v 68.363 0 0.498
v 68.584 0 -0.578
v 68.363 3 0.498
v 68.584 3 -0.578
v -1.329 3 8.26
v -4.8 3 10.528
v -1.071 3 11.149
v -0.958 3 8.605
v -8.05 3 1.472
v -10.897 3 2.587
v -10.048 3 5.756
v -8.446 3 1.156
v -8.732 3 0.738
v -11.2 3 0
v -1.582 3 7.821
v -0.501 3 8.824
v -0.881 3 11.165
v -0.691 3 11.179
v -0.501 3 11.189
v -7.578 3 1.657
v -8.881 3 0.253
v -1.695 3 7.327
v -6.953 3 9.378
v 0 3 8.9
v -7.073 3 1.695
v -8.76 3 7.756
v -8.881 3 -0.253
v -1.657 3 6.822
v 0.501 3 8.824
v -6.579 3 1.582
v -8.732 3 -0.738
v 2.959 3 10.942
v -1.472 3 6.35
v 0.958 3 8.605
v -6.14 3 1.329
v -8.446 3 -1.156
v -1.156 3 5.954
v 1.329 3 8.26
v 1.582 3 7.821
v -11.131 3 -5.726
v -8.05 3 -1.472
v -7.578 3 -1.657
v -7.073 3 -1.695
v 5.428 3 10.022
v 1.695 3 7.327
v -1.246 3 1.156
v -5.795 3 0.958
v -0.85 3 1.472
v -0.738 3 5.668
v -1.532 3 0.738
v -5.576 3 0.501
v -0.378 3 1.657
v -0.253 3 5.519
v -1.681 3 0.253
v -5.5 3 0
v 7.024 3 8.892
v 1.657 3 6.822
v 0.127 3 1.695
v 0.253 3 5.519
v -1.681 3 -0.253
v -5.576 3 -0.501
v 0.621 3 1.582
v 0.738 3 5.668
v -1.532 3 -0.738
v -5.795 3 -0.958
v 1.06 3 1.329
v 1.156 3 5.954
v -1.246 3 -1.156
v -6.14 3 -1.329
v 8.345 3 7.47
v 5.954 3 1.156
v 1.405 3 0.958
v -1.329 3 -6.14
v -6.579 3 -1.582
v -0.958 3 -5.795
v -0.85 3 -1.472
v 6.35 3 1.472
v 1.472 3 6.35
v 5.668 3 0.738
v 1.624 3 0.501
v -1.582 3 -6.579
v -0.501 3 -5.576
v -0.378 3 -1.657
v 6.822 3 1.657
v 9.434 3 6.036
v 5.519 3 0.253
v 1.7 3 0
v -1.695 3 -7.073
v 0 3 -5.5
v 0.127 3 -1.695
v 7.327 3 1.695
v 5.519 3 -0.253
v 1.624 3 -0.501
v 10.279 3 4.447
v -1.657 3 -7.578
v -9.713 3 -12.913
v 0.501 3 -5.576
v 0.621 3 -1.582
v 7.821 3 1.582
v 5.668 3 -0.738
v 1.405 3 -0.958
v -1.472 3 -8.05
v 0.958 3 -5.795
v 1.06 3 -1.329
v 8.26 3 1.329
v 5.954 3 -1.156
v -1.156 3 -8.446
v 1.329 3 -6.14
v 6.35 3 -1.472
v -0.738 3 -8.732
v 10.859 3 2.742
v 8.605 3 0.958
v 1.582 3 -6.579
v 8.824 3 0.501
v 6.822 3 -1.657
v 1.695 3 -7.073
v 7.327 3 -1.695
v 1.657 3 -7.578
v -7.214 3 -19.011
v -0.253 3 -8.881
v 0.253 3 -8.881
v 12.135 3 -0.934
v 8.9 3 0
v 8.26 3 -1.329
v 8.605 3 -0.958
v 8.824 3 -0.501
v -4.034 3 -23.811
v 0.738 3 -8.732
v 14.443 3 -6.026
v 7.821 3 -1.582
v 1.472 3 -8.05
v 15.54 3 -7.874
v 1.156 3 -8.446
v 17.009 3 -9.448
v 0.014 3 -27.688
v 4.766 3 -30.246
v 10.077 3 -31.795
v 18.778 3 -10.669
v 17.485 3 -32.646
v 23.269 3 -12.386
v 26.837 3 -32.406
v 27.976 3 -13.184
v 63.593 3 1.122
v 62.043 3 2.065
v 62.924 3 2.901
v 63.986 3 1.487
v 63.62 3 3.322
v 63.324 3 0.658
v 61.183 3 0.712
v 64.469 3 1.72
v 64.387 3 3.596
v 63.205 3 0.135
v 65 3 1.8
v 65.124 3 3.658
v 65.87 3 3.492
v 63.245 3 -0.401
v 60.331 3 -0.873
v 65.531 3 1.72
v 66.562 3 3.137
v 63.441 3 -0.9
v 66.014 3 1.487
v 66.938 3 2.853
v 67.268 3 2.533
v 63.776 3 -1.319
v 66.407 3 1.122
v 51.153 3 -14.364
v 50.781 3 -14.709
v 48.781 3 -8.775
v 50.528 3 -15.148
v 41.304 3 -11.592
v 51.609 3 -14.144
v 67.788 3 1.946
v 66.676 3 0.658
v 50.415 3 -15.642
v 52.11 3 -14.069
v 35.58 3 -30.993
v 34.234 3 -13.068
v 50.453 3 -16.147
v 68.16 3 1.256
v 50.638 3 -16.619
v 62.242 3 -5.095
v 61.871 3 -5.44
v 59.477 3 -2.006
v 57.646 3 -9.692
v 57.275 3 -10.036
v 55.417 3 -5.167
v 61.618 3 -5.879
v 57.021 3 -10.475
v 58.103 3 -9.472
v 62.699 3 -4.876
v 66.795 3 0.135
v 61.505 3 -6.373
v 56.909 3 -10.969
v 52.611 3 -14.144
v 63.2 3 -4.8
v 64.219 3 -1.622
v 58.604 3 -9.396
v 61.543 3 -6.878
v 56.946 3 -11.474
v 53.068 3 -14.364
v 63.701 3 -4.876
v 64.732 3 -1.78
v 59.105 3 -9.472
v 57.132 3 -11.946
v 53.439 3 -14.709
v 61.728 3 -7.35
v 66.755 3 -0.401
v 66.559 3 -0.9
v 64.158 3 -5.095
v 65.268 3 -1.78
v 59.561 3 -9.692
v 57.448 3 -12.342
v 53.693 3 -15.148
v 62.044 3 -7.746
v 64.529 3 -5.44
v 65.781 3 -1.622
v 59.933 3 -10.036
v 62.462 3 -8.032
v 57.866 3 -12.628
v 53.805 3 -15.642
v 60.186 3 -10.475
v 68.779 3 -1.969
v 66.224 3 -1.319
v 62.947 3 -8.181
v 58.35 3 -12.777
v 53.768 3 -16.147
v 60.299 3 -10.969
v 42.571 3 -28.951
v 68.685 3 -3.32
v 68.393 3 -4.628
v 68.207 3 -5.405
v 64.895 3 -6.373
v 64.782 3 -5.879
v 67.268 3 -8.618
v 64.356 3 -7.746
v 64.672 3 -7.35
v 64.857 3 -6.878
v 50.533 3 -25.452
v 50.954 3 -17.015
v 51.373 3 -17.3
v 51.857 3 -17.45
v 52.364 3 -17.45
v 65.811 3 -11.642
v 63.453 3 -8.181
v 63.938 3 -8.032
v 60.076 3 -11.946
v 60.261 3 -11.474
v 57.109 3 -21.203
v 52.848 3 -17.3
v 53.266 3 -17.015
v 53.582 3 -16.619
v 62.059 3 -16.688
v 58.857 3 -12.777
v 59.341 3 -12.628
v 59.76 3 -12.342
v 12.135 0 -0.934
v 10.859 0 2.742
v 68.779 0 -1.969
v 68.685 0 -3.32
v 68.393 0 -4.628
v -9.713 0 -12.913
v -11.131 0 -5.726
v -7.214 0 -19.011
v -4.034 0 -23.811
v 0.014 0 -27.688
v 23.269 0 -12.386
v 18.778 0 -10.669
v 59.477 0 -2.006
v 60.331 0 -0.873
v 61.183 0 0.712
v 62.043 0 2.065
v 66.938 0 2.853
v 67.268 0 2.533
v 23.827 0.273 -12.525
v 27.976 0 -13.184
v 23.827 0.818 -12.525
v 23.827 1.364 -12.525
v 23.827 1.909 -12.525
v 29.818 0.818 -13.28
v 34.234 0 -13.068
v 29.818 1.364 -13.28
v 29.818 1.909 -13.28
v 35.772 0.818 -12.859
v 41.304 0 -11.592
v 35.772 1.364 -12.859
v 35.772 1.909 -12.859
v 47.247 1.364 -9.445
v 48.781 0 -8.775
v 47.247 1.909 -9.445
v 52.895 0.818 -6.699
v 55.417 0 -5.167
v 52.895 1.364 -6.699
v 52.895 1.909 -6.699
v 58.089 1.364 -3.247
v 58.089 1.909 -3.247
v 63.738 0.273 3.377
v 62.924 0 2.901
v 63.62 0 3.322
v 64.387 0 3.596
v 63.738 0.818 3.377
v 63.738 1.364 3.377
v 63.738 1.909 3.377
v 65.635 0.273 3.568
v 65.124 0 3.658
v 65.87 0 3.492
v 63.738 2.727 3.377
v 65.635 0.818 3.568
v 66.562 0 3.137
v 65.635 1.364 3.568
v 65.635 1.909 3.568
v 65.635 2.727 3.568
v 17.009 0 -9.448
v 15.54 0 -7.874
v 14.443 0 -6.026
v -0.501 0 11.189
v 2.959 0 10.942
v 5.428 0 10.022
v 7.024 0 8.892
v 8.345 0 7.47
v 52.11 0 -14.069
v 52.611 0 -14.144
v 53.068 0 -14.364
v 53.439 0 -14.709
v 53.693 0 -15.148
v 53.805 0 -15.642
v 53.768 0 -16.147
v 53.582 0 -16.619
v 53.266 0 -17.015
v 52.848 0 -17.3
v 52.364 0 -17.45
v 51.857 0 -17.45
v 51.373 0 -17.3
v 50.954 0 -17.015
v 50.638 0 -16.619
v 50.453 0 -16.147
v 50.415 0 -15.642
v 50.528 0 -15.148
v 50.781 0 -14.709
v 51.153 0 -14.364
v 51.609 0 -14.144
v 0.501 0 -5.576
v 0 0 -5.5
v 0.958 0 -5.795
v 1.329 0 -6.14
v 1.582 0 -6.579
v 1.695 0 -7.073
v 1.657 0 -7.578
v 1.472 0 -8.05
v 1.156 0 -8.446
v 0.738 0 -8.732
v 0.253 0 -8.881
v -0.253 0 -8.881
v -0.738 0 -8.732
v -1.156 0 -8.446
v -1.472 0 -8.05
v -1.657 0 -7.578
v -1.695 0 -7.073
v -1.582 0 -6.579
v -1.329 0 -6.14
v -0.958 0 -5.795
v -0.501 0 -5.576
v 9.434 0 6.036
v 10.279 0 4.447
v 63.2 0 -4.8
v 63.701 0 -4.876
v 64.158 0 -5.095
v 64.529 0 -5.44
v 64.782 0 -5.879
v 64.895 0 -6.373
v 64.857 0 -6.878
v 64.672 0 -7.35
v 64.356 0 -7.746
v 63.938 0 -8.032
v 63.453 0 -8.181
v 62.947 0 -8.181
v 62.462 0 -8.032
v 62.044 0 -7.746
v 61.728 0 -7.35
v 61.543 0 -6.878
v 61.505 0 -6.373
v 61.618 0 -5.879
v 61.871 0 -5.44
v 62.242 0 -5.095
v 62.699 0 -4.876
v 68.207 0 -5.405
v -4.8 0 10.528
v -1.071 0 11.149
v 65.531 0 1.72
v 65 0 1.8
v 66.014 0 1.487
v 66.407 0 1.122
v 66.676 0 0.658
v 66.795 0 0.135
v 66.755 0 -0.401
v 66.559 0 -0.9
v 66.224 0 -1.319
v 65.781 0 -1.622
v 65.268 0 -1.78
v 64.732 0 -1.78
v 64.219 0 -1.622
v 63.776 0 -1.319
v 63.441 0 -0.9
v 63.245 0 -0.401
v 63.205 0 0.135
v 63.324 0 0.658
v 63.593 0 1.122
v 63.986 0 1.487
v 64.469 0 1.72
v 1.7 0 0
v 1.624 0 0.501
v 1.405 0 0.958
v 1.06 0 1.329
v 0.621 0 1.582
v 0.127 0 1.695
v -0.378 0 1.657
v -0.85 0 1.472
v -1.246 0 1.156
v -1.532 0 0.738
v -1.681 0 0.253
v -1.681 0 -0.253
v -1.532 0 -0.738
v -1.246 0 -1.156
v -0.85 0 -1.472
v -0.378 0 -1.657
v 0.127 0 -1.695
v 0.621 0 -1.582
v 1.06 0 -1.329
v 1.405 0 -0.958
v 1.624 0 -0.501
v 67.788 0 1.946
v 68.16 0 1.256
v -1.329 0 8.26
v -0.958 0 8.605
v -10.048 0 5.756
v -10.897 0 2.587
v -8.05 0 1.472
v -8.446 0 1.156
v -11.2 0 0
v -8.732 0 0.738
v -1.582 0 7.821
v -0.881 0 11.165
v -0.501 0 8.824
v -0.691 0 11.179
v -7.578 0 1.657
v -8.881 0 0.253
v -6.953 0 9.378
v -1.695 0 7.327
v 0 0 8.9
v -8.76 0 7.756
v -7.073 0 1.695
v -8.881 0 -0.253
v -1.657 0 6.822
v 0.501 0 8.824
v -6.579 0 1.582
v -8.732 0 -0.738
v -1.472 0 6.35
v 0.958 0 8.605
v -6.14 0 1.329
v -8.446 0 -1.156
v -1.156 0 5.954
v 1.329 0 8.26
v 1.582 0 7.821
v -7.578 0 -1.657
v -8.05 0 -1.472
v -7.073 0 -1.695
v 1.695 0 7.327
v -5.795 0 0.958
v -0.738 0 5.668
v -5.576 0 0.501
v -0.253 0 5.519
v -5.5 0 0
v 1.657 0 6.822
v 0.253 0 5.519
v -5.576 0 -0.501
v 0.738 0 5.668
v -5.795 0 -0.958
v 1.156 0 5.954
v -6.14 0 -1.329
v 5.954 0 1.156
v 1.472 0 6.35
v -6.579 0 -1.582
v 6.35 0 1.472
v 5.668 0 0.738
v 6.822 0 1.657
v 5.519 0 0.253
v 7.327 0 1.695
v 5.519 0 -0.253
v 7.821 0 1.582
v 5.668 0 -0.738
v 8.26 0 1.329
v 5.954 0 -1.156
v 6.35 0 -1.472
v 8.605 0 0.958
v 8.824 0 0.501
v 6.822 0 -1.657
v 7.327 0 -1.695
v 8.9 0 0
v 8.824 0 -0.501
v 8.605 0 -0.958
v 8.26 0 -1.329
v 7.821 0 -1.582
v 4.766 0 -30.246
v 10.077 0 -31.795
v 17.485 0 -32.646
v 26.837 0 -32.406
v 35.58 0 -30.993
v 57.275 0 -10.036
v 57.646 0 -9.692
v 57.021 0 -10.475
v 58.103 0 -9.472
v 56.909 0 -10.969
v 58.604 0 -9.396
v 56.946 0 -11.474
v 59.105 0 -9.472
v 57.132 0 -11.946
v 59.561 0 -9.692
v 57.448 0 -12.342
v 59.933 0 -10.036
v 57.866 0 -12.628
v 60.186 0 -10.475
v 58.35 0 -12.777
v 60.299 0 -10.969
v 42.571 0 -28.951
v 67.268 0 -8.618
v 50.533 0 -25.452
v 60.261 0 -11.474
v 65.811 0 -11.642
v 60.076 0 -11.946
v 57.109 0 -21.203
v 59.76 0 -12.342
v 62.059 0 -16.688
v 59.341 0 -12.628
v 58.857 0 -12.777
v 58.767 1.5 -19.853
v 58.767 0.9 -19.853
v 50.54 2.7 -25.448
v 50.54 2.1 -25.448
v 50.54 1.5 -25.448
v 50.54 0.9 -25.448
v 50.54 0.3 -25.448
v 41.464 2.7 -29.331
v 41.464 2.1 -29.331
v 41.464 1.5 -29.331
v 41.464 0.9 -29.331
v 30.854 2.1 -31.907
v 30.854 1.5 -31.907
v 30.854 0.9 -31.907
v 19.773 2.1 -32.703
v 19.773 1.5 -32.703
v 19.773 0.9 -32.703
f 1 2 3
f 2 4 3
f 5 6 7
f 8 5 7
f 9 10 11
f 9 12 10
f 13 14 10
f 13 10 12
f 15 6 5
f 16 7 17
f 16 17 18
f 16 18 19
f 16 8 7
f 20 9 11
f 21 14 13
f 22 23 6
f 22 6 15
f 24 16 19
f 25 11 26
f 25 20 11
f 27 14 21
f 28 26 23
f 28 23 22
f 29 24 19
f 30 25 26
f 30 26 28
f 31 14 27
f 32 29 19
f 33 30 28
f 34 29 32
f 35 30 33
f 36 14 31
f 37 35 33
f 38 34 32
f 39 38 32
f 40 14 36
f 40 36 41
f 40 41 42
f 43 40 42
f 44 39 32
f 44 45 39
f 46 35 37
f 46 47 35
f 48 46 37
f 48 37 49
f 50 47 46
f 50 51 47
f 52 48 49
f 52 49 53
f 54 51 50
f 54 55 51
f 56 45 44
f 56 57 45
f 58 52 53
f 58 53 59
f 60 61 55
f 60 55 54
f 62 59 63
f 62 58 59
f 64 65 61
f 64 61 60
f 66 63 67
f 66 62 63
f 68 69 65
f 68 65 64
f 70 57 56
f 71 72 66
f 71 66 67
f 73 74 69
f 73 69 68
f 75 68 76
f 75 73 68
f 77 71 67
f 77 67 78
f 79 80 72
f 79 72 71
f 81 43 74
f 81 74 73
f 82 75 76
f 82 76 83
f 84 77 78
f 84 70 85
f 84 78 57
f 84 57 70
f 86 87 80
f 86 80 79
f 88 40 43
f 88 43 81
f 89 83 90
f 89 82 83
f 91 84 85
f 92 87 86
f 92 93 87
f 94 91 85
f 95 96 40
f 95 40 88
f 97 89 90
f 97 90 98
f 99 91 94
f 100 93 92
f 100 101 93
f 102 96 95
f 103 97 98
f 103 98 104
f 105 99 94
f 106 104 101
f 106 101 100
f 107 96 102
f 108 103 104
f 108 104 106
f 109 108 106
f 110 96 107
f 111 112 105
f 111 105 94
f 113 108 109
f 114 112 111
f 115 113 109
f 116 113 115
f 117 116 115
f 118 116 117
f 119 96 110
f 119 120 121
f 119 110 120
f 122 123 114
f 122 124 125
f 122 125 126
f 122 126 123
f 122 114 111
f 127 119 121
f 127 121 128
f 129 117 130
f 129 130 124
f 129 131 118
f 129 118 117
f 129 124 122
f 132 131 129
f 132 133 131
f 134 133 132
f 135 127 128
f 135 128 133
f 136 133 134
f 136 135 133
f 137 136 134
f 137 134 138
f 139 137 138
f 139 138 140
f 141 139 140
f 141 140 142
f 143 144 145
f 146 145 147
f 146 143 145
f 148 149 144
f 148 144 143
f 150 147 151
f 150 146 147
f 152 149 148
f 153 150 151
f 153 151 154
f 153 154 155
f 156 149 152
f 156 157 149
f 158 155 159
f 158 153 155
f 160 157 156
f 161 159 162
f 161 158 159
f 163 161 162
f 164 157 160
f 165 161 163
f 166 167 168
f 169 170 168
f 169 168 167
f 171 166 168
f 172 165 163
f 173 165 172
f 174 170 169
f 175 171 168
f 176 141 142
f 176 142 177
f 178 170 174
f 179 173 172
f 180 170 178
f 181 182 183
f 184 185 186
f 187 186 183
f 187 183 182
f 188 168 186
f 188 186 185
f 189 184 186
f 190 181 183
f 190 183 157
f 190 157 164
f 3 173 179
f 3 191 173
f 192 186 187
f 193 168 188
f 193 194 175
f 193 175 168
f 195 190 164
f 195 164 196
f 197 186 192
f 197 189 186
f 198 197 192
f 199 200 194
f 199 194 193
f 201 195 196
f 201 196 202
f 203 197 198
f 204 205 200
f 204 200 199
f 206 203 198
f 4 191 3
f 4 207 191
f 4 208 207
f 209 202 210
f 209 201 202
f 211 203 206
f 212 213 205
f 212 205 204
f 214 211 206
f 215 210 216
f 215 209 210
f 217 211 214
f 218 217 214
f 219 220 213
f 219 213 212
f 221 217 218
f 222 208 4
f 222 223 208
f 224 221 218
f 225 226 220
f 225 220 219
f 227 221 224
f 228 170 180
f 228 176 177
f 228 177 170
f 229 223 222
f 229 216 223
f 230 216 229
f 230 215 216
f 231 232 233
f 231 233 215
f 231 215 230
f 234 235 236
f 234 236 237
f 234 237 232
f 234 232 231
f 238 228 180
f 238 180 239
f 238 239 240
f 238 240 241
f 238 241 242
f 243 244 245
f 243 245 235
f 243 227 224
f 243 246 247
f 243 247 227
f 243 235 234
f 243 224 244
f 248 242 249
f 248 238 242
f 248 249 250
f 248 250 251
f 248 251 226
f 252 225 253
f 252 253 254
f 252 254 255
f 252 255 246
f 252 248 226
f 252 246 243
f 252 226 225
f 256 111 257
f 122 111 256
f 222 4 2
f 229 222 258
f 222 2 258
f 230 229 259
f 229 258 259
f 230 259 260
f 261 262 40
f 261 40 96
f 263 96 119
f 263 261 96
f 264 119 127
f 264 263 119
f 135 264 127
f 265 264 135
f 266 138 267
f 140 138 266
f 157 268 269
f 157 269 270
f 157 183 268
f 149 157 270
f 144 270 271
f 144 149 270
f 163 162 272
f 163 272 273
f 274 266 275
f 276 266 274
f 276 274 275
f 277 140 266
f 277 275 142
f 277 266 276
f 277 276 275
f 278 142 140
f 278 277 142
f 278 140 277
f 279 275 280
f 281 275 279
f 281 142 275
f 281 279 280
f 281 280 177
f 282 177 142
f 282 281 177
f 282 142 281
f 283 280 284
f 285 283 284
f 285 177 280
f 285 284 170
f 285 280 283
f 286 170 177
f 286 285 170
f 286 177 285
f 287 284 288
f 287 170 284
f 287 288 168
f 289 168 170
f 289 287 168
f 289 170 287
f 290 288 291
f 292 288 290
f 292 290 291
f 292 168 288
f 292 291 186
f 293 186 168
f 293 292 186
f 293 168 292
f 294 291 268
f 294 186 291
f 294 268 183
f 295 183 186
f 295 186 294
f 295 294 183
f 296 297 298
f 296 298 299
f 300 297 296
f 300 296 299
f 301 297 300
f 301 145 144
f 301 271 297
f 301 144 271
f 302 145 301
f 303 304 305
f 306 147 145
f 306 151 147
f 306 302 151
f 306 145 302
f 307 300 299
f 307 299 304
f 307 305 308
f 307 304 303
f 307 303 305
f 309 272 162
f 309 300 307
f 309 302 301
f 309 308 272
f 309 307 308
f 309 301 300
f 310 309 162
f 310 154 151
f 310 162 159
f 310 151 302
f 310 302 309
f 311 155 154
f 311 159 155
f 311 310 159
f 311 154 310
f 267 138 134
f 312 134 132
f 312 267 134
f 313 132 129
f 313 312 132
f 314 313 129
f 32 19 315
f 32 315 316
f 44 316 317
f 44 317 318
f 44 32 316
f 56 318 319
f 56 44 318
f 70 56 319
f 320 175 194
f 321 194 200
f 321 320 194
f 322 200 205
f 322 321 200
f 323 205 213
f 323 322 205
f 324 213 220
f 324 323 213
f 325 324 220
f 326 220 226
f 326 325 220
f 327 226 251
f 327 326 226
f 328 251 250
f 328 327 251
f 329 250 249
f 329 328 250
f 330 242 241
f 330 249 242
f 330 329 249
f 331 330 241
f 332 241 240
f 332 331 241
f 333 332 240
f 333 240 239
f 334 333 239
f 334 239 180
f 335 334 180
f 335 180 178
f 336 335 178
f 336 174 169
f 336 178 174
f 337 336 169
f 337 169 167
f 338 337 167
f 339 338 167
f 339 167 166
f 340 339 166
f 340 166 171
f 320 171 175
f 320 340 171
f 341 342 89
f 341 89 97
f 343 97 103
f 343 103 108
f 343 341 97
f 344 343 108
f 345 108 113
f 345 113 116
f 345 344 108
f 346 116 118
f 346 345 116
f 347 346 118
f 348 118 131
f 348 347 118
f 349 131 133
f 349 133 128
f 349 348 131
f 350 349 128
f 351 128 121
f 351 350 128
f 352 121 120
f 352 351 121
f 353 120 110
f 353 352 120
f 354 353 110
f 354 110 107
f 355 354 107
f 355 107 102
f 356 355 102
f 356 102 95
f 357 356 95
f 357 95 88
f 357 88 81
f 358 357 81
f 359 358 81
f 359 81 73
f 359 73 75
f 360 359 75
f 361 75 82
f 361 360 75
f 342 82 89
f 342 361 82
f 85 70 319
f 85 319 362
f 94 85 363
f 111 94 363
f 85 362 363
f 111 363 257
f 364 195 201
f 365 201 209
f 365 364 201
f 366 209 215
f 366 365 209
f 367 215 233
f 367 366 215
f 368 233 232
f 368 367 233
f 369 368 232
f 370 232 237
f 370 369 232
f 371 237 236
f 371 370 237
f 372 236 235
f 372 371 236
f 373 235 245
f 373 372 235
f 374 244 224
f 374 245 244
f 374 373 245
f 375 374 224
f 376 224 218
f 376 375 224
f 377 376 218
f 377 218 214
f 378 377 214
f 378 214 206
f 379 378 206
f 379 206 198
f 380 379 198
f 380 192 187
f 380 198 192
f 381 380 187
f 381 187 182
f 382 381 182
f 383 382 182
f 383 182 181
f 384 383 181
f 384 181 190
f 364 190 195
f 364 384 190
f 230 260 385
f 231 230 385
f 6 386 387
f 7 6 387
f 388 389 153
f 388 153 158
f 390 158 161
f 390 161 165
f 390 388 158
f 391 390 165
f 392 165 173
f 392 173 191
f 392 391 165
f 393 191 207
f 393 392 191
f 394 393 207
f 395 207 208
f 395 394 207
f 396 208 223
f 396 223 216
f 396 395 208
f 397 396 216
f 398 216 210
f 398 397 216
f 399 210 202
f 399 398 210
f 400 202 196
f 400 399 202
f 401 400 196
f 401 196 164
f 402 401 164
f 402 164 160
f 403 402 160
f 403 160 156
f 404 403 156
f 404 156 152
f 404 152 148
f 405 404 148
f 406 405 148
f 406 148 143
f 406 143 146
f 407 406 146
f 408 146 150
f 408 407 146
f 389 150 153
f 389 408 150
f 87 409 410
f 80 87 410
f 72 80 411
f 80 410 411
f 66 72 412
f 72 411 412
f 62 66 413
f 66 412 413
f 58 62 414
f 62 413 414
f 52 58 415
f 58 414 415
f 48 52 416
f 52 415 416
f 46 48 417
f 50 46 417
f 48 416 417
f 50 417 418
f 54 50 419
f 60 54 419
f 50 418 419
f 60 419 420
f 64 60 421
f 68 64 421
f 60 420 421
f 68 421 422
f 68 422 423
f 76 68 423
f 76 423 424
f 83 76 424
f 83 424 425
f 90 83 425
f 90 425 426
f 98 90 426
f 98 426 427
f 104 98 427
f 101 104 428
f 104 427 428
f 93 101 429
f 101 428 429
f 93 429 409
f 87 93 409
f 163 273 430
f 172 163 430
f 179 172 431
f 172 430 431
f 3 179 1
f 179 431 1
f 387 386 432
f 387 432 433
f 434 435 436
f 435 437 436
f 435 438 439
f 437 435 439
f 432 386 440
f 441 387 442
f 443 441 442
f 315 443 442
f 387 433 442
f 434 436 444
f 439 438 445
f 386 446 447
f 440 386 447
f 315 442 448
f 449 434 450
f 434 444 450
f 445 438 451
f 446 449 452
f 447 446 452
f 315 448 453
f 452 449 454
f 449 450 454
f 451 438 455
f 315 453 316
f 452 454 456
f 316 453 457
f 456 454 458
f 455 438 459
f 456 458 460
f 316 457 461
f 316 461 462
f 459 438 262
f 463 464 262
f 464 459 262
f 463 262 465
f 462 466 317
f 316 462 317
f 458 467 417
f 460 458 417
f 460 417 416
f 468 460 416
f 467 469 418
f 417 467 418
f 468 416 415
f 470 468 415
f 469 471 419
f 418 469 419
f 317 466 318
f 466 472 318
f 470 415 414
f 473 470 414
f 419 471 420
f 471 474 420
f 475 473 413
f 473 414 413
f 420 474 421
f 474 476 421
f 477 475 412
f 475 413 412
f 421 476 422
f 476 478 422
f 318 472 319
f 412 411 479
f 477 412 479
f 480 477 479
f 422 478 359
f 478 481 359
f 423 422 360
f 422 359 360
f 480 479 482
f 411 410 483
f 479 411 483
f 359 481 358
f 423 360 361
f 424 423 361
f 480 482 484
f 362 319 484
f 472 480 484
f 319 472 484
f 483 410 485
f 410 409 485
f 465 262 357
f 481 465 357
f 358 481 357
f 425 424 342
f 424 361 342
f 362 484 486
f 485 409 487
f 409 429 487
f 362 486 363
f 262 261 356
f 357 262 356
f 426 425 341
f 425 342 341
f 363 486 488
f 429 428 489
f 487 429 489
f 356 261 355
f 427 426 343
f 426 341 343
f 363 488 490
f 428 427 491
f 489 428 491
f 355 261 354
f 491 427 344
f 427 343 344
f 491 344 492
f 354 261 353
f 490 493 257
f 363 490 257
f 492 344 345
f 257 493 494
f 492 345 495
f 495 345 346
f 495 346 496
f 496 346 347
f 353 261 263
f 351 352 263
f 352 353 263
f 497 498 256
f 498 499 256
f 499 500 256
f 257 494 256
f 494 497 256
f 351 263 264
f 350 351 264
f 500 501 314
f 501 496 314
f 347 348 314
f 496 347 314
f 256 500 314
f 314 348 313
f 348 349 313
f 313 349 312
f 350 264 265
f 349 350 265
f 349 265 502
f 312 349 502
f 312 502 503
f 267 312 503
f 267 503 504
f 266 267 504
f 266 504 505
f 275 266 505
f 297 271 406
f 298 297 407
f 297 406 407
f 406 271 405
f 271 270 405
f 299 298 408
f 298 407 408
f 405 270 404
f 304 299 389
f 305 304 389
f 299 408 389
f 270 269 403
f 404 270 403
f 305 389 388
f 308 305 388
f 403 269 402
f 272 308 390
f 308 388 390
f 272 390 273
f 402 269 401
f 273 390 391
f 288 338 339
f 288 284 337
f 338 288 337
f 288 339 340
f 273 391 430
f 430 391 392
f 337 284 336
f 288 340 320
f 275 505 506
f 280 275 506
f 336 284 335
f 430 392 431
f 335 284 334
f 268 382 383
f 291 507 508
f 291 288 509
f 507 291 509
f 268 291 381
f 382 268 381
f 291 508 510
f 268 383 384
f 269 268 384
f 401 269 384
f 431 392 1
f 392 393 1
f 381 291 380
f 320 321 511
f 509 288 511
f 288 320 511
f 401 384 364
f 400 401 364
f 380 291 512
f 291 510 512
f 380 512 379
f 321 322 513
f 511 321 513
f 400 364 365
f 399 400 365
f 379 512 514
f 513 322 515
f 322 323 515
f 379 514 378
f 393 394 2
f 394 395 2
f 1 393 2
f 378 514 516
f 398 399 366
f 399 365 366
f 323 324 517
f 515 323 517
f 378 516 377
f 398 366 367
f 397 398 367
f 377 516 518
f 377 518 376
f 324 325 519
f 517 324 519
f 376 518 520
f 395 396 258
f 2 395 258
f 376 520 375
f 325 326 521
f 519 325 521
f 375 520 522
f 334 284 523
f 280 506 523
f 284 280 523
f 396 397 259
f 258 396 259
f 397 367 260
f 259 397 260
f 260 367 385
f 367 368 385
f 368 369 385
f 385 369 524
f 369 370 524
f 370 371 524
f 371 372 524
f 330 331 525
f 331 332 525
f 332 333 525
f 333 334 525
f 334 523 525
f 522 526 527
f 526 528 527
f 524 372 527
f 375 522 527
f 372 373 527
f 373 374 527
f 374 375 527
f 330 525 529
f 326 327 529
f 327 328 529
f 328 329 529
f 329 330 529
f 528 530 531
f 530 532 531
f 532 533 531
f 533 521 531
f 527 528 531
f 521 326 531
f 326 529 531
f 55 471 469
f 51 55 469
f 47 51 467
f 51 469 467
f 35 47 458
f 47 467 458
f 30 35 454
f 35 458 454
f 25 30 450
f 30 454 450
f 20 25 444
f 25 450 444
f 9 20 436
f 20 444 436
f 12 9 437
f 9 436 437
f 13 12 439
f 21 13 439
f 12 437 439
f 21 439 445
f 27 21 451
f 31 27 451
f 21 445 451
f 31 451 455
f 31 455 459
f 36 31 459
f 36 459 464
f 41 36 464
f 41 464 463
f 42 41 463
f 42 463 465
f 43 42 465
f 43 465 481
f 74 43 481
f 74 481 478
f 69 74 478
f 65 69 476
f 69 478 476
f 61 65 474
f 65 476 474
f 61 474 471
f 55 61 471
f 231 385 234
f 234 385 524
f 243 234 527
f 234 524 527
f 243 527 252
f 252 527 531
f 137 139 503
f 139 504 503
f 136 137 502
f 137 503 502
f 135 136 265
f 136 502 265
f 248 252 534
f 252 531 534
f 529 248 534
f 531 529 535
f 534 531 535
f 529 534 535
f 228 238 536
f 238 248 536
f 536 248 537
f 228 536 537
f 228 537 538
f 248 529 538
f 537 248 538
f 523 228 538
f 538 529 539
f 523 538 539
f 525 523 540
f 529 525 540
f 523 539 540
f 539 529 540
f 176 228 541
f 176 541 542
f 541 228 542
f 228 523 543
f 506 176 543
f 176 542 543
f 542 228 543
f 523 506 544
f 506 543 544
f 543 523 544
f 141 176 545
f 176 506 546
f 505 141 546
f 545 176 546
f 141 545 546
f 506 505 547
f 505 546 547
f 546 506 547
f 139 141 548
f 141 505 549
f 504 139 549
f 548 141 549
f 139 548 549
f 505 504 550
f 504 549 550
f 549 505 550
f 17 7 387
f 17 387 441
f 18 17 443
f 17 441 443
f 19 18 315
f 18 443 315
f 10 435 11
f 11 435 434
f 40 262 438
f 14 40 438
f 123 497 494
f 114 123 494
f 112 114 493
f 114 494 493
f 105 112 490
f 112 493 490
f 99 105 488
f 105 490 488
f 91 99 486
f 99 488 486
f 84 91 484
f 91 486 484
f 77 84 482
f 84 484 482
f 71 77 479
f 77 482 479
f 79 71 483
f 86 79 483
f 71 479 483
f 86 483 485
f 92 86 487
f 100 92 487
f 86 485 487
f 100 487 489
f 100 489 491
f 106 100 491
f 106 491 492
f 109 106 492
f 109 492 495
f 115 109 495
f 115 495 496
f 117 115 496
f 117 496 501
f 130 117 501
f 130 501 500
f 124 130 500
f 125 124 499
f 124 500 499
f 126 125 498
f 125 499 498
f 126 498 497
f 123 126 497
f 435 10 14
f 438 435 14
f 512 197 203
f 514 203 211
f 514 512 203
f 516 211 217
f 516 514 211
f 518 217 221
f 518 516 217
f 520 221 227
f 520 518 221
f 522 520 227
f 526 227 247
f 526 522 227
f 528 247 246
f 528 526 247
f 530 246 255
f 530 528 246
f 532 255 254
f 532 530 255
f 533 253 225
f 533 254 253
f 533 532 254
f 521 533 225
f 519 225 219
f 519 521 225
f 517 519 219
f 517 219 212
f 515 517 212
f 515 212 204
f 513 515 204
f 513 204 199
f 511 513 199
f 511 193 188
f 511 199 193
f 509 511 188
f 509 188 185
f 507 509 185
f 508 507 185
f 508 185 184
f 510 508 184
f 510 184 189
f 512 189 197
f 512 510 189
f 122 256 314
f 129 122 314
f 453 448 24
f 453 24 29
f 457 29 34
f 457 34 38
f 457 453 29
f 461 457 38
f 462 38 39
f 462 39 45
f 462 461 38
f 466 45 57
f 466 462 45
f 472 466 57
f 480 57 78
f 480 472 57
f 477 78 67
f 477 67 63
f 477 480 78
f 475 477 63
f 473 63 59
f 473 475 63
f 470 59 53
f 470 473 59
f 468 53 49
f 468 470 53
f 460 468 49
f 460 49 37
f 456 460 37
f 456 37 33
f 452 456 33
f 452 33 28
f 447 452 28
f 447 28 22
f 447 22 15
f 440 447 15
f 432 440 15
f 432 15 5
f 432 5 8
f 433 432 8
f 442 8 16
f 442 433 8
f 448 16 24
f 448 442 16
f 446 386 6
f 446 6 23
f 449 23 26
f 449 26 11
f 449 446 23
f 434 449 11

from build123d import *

# Parameters (mm, degrees)
SKETCH_1_R          = 1.7
EXTRUDE_1_DEPTH     = 3
CUT_EXTRUDE_3_DEPTH = 3
SKETCH_3_R          = 1.7
EXTRUDE_3_DEPTH     = 3
FILLET_9_R          = 10
FILLET_10_R         = 10
FILLET_14_R         = 20
EXTRUDE_4_DEPTH     = 3
CUT_EXTRUDE_4_DEPTH = 3
EXTRUDE_6_DEPTH     = 3
FILLET_20_R         = 10
FILLET_21_R         = 10
SKETCH_8_R          = 1.8
CUT_EXTRUDE_5_DEPTH = 3
SKETCH_9_R          = 1.7
CUT_EXTRUDE_6_DEPTH = 10


with BuildPart() as part:
    # 草图1 → 凸台-拉伸1 (new body)
    # profile 1 of 23: a face of its own
    with BuildSketch(Plane(origin=(0, 0, 0), x_dir=(1, 0, 0), z_dir=(0, 1, 0))):
        with BuildLine():
            ThreePointArc((5.5, 0), (7.2, 1.7), (8.9, 0))
            Line((8.9, 0), (11.2, 0))
            ThreePointArc((11.2, 0), (9.208552546, 6.375151763), (3.9424, 10.4832))
            ThreePointArc((3.9424, 10.4832), (2.837711379, 10.834546328), (1.702623658, 11.06982713))
            ThreePointArc((1.702623658, 11.06982713), (-7.292825757, 8.500276024), (-11.2, 0))
            Line((-11.2, 0), (-8.9, 0))
            ThreePointArc((-8.9, 0), (-7.2, 1.7), (-5.5, 0))
            Line((-5.5, 0), (-1.7, 0))
            ThreePointArc((-1.7, 0), (0, 1.7), (1.7, 0))
            Line((1.7, 0), (5.5, 0))
        make_face()
        with Locations(Location((0, 7.2, 0), (0, 0, 270))):
            Circle(SKETCH_1_R, mode=Mode.SUBTRACT)
    # profile 2 of 23: a face of its own
    with BuildSketch(Plane(origin=(0, 0, 0), x_dir=(1, 0, 0), z_dir=(0, 1, 0))):
        with BuildLine():
            Line((11.2, 0), (8.9, 0))
            ThreePointArc((8.9, 0), (7.2, -1.7), (5.5, 0))
            Line((5.5, 0), (1.7, 0))
            ThreePointArc((1.7, 0), (0, -1.7), (-1.7, 0))
            Line((-1.7, 0), (-5.5, 0))
            ThreePointArc((-5.5, 0), (-7.2, -1.7), (-8.9, 0))
            Line((-8.9, 0), (-11.2, 0))
            ThreePointArc((-11.2, 0), (0, -11.2), (11.2, 0))
        make_face()
        with Locations(Location((0, -7.2, 0), (0, 0, 270))):
            Circle(SKETCH_1_R, mode=Mode.SUBTRACT)
    # profile 3 of 23: a face of its own
    with BuildSketch(Plane(origin=(0, 0, 0), x_dir=(1, 0, 0), z_dir=(0, 1, 0))):
        with BuildLine():
            ThreePointArc((36.4, 25.2), (54.219090886, 17.819090886), (61.6, 0))
            ThreePointArc((61.6, 0), (62.902494764, 2.675905788), (65.812042226, 3.301603765))
            ThreePointArc((65.812042226, 3.301603765), (37.256587325, 36.064283099), (1.702623658, 11.06982713))
            ThreePointArc((1.702623658, 11.06982713), (2.837711379, 10.834546328), (3.9424, 10.4832))
            ThreePointArc((3.9424, 10.4832), (17.872608925, 22.911095384), (36.4, 25.2))
        make_face()
    # profile 4 of 23: a face of its own
    with BuildSketch(Plane(origin=(0, 0, 0), x_dir=(1, 0, 0), z_dir=(0, 1, 0))):
        with BuildLine():
            ThreePointArc((68.4, 0), (28.6, 39.8), (-11.2, 0))
            ThreePointArc((-11.2, 0), (-7.292825757, 8.500276024), (1.702623658, 11.06982713))
            ThreePointArc((1.702623658, 11.06982713), (37.256587325, 36.064283099), (65.812042226, 3.301603765))
            ThreePointArc((65.812042226, 3.301603765), (67.675905788, 2.097505236), (68.4, 0))
        make_face()
    # profile 5 of 23: a face of its own
    with BuildSketch(Plane(origin=(0, 0, 0), x_dir=(1, 0, 0), z_dir=(0, 1, 0))):
        with BuildLine():
            ThreePointArc((3.9424, 10.4832), (9.208552546, 6.375151763), (11.2, 0))
            ThreePointArc((11.2, 0), (18.580909114, 17.819090886), (36.4, 25.2))
            ThreePointArc((36.4, 25.2), (17.872608925, 22.911095384), (3.9424, 10.4832))
        make_face()
    # profile 6 of 23: a face of its own
    with BuildSketch(Plane(origin=(0, 0, 0), x_dir=(1, 0, 0), z_dir=(0, 1, 0))):
        with BuildLine():
            ThreePointArc((36.4, 25.2), (52.935943621, 16.535943621), (61.6, 0))
            ThreePointArc((61.6, 0), (54.219090886, 17.819090886), (36.4, 25.2))
        make_face()
    # profile 7 of 23: a face of its own
    with BuildSketch(Plane(origin=(0, 0, 0), x_dir=(1, 0, 0), z_dir=(0, 1, 0))):
        with BuildLine():
            ThreePointArc((65.812042226, 3.301603765), (62.902494764, 2.675905788), (61.6, 0))
            Line((61.6, 0), (63.3, 0))
            ThreePointArc((63.3, 0), (64.094189641, 1.438578324), (65.734714816, 1.533034291))
            ThreePointArc((65.734714816, 1.533034291), (65.785435342, 2.416791866), (65.812042226, 3.301603765))
        make_face()
    # profile 8 of 23: a face of its own
    with BuildSketch(Plane(origin=(0, 0, 0), x_dir=(1, 0, 0), z_dir=(0, 1, 0))):
        with BuildLine():
            Line((63.3, 0), (61.6, 0))
            ThreePointArc((61.6, 0), (62.595836944, -2.404163056), (65, -3.4))
            ThreePointArc((65, -3.4), (65.185488011, -2.534439938), (65.347308419, -1.664144483))
            ThreePointArc((65.347308419, -1.664144483), (63.927718394, -1.319171011), (63.3, 0))
        make_face()
    # profile 9 of 23: a face of its own
    with BuildSketch(Plane(origin=(0, 0, 0), x_dir=(1, 0, 0), z_dir=(0, 1, 0))):
        with BuildLine():
            ThreePointArc((65.347308419, -1.664144483), (65.185488011, -2.534439938), (65, -3.4))
            ThreePointArc((65, -3.4), (67.404163056, -2.404163056), (68.4, 0))
            Line((68.4, 0), (66.7, 0))
            ThreePointArc((66.7, 0), (66.319171011, -1.072281606), (65.347308419, -1.664144483))
        make_face()
    # profile 10 of 23: a face of its own
    with BuildSketch(Plane(origin=(0, 0, 0), x_dir=(1, 0, 0), z_dir=(0, 1, 0))):
        with BuildLine():
            ThreePointArc((68.4, 0), (67.675905788, 2.097505236), (65.812042226, 3.301603765))
            ThreePointArc((65.812042226, 3.301603765), (65.785435342, 2.416791866), (65.734714816, 1.533034291))
            ThreePointArc((65.734714816, 1.533034291), (66.438578324, 0.905810359), (66.7, 0))
            Line((66.7, 0), (68.4, 0))
        make_face()
    # profile 11 of 23: a face of its own
    with BuildSketch(Plane(origin=(0, 0, 0), x_dir=(1, 0, 0), z_dir=(0, 1, 0))):
        with BuildLine():
            ThreePointArc((65.812042226, 3.301603765), (62.902494764, 2.675905788), (61.6, 0))
            Line((61.6, 0), (63.3, 0))
            ThreePointArc((63.3, 0), (64.094189641, 1.438578324), (65.734714816, 1.533034291))
            ThreePointArc((65.734714816, 1.533034291), (65.785435342, 2.416791866), (65.812042226, 3.301603765))
        make_face()
    # profile 12 of 23: a face of its own
    with BuildSketch(Plane(origin=(0, 0, 0), x_dir=(1, 0, 0), z_dir=(0, 1, 0))):
        with BuildLine():
            Line((63.3, 0), (61.6, 0))
            ThreePointArc((61.6, 0), (62.595836944, -2.404163056), (65, -3.4))
            ThreePointArc((65, -3.4), (65.185488011, -2.534439938), (65.347308419, -1.664144483))
            ThreePointArc((65.347308419, -1.664144483), (63.927718394, -1.319171011), (63.3, 0))
        make_face()
    # profile 13 of 23: a face of its own
    with BuildSketch(Plane(origin=(0, 0, 0), x_dir=(1, 0, 0), z_dir=(0, 1, 0))):
        with BuildLine():
            ThreePointArc((65.347308419, -1.664144483), (65.185488011, -2.534439938), (65, -3.4))
            ThreePointArc((65, -3.4), (67.404163056, -2.404163056), (68.4, 0))
            Line((68.4, 0), (66.7, 0))
            ThreePointArc((66.7, 0), (66.319171011, -1.072281606), (65.347308419, -1.664144483))
        make_face()
    # profile 14 of 23: a face of its own
    with BuildSketch(Plane(origin=(0, 0, 0), x_dir=(1, 0, 0), z_dir=(0, 1, 0))):
        with BuildLine():
            ThreePointArc((68.4, 0), (67.675905788, 2.097505236), (65.812042226, 3.301603765))
            ThreePointArc((65.812042226, 3.301603765), (65.785435342, 2.416791866), (65.734714816, 1.533034291))
            ThreePointArc((65.734714816, 1.533034291), (66.438578324, 0.905810359), (66.7, 0))
            Line((66.7, 0), (68.4, 0))
        make_face()
    # profile 15 of 23: a face of its own
    with BuildSketch(Plane(origin=(0, 0, 0), x_dir=(1, 0, 0), z_dir=(0, 1, 0))):
        with BuildLine():
            ThreePointArc((65.812042226, 3.301603765), (62.902494764, 2.675905788), (61.6, 0))
            Line((61.6, 0), (63.3, 0))
            ThreePointArc((63.3, 0), (64.094189641, 1.438578324), (65.734714816, 1.533034291))
            ThreePointArc((65.734714816, 1.533034291), (65.785435342, 2.416791866), (65.812042226, 3.301603765))
        make_face()
    # profile 16 of 23: a face of its own
    with BuildSketch(Plane(origin=(0, 0, 0), x_dir=(1, 0, 0), z_dir=(0, 1, 0))):
        with BuildLine():
            Line((63.3, 0), (61.6, 0))
            ThreePointArc((61.6, 0), (62.595836944, -2.404163056), (65, -3.4))
            ThreePointArc((65, -3.4), (65.185488011, -2.534439938), (65.347308419, -1.664144483))
            ThreePointArc((65.347308419, -1.664144483), (63.927718394, -1.319171011), (63.3, 0))
        make_face()
    # profile 17 of 23: a face of its own
    with BuildSketch(Plane(origin=(0, 0, 0), x_dir=(1, 0, 0), z_dir=(0, 1, 0))):
        with BuildLine():
            ThreePointArc((65.347308419, -1.664144483), (65.185488011, -2.534439938), (65, -3.4))
            ThreePointArc((65, -3.4), (67.404163056, -2.404163056), (68.4, 0))
            Line((68.4, 0), (66.7, 0))
            ThreePointArc((66.7, 0), (66.319171011, -1.072281606), (65.347308419, -1.664144483))
        make_face()
    # profile 18 of 23: a face of its own
    with BuildSketch(Plane(origin=(0, 0, 0), x_dir=(1, 0, 0), z_dir=(0, 1, 0))):
        with BuildLine():
            ThreePointArc((68.4, 0), (67.675905788, 2.097505236), (65.812042226, 3.301603765))
            ThreePointArc((65.812042226, 3.301603765), (65.785435342, 2.416791866), (65.734714816, 1.533034291))
            ThreePointArc((65.734714816, 1.533034291), (66.438578324, 0.905810359), (66.7, 0))
            Line((66.7, 0), (68.4, 0))
        make_face()
    # profile 19 of 23: a face of its own
    with BuildSketch(Plane(origin=(0, 0, 0), x_dir=(1, 0, 0), z_dir=(0, 1, 0))):
        with BuildLine():
            ThreePointArc((65.812042226, 3.301603765), (62.902494764, 2.675905788), (61.6, 0))
            Line((61.6, 0), (63.3, 0))
            ThreePointArc((63.3, 0), (64.094189641, 1.438578324), (65.734714816, 1.533034291))
            ThreePointArc((65.734714816, 1.533034291), (65.785435342, 2.416791866), (65.812042226, 3.301603765))
        make_face()
    # profile 20 of 23: a face of its own
    with BuildSketch(Plane(origin=(0, 0, 0), x_dir=(1, 0, 0), z_dir=(0, 1, 0))):
        with BuildLine():
            Line((63.3, 0), (61.6, 0))
            ThreePointArc((61.6, 0), (62.595836944, -2.404163056), (65, -3.4))
            ThreePointArc((65, -3.4), (65.185488011, -2.534439938), (65.347308419, -1.664144483))
            ThreePointArc((65.347308419, -1.664144483), (63.927718394, -1.319171011), (63.3, 0))
        make_face()
    # profile 21 of 23: a face of its own
    with BuildSketch(Plane(origin=(0, 0, 0), x_dir=(1, 0, 0), z_dir=(0, 1, 0))):
        with BuildLine():
            ThreePointArc((65.347308419, -1.664144483), (65.185488011, -2.534439938), (65, -3.4))
            ThreePointArc((65, -3.4), (67.404163056, -2.404163056), (68.4, 0))
            Line((68.4, 0), (66.7, 0))
            ThreePointArc((66.7, 0), (66.319171011, -1.072281606), (65.347308419, -1.664144483))
        make_face()
    # profile 22 of 23: a face of its own
    with BuildSketch(Plane(origin=(0, 0, 0), x_dir=(1, 0, 0), z_dir=(0, 1, 0))):
        with BuildLine():
            ThreePointArc((68.4, 0), (67.675905788, 2.097505236), (65.812042226, 3.301603765))
            ThreePointArc((65.812042226, 3.301603765), (65.785435342, 2.416791866), (65.734714816, 1.533034291))
            ThreePointArc((65.734714816, 1.533034291), (66.438578324, 0.905810359), (66.7, 0))
            Line((66.7, 0), (68.4, 0))
        make_face()
    # profile 23 of 23: a face of its own
    with BuildSketch(Plane(origin=(0, 0, 0), x_dir=(1, 0, 0), z_dir=(0, 1, 0))):
        with BuildLine():
            ThreePointArc((36.4, 25.2), (18.580909114, 17.819090886), (11.2, 0))
            Line((11.2, 0), (61.6, 0))
            ThreePointArc((61.6, 0), (52.935943621, 16.535943621), (36.4, 25.2))
        make_face()
    extrude(amount=EXTRUDE_1_DEPTH)

    # 草图2 → 切除-拉伸3 (cut)
    with BuildSketch(Plane(origin=(0, 0, 0), x_dir=(1, 0, 0), z_dir=(0, 1, 0))):
        with BuildLine():
            Line((68.849577541, -5.350147526), (79.418255921, 26.798886108))
            Line((79.418255921, 26.798886108), (41.510241853, 45.721250392))
            Line((41.510241853, 45.721250392), (-3.738890131, 40.215411955))
            Line((-3.738890131, 40.215411955), (-19.437922992, 8.764841107))
            Line((-19.437922992, 8.764841107), (-13.991141015, 0))
            Line((-13.991141015, 0), (-11.2, 0))
            add(Edge.make_bspline(
                [(-11.2, 0), (-10.98570603, 9.511964616), (-6.790384007, 26.883440864), (30.257690246, 38.217930428), (69.370809067, 18.750082571), (68.849577541, -5.350147526)],
                knots=[0, 0, 0, 0, 0.267985993, 0.373432138, 1, 1, 1, 1], degree=3))
        make_face()
        with BuildLine():
            Line((11.2, 0), (61.6, 0))
            add(Edge.make_bspline(
                [(11.2, 0), (14.907237051, 24.878878013), (54.036546726, 12.1796003), (61.6, 0)],
                knots=[0, 0, 0, 0, 1, 1, 1, 1], degree=3))
        make_face()
    extrude(amount=CUT_EXTRUDE_3_DEPTH, mode=Mode.SUBTRACT)

    # 草图3 → 凸台-拉伸3 (add)
    with BuildSketch(Plane(origin=(0, 0, 0), x_dir=(1, 0, 0), z_dir=(0, 1, 0))):
        with Locations((65, 0)):
            Circle(SKETCH_3_R)
        with BuildLine():
            add(Edge.make_bspline(
                [(11.2, 0), (12.445613849, -0.056946933), (16.571407935, 16.802360329), (35.788824905, 14.252683642), (51.249640161, 9.442422377), (60.238259143, 2.741563074), (64.770360278, -5.187357593), (69.206577143, -0.002495132), (68.396099439, 6.376713893), (55.968118328, 24.950216267), (5.625904457, 36.508565927), (9.990497003, 0.055296018), (11.2, 0)],
                knots=[0, 0, 0, 0, 0.081161217, 0.198317789, 0.331056992, 0.406547513, 0.438622354, 0.470697196, 0.501390038, 0.565670643, 0.92119168, 1, 1, 1, 1], degree=3))
        make_face()
    extrude(amount=EXTRUDE_3_DEPTH)

    # 圆角9
    fillet_9_edges = [part.edges().sort_by_distance(p)[0] for p in [
        (17.059648691, 1.5, -10.662861344),
        (11.2, 1.5, 0),
    ]]
    fillet(fillet_9_edges, radius=FILLET_9_R)

    # 圆角10
    fillet_10_edges = [part.edges().sort_by_distance(p)[0] for p in [
        (68.4, 1.5, 0),
        (61.6, 1.5, 0),
    ]]
    fillet(fillet_10_edges, radius=FILLET_10_R)

    # 圆角14
    fillet_14_edges = [part.edges().sort_by_distance(p)[0] for p in [
        (59.25376733, 1.5, -16.163619627),
    ]]
    fillet(fillet_14_edges, radius=FILLET_14_R)

    # 草图4 → 凸台-拉伸4 (add)
    with BuildSketch(Plane(origin=(0, 0, 0), x_dir=(1, 0, 0), z_dir=(0, 1, 0))):
        with BuildLine():
            Line((5.205364174, -8.263457931), (-0.456140463, -10.299055104))
            Line((-0.456140463, -10.299055104), (-8.725753977, -3.492527057))
            Line((-8.725753977, -3.492527057), (-9.61632774, 1.660078286))
            Line((-9.61632774, 1.660078286), (-4.051653355, 17.482622071))
            Line((-4.051653355, 17.482622071), (31.159228128, 24.115259599))
            Line((31.159228128, 24.115259599), (64.810193891, 6.04933469))
            Line((64.810193891, 6.04933469), (67.227465534, 0))
            Line((67.227465534, 0), (68.363274916, -0.498379212))
            add(Edge.make_bspline(
                [(68.363274916, -0.498379212), (69.532708963, 7.730280313), (60.738469504, 20.627242961), (41.024169704, 30.636446502), (20.620918144, 33.805709868), (-5.259875882, 29.990734693), (-13.072652033, 6.858797725), (-10.268154966, -6.40085846), (-7.775524094, -9.61750499), (-6.466783991, -9.922623082), (-2.26188398, -11.569131778), (2.33580519, -11.773246089), (5.205364174, -8.263457931)],
                knots=[0, 0, 0, 0, 0.167183895, 0.308915578, 0.466622559, 0.613185698, 0.827690468, 0.89009779, 0.902058544, 0.911312027, 0.918105774, 1, 1, 1, 1], degree=3))
        make_face()
    extrude(amount=EXTRUDE_4_DEPTH)

    # 草图6 → 切除-拉伸4 (cut)
    with BuildSketch(Plane(origin=(0, 0, 0), x_dir=(1, 0, 0), z_dir=(0, 1, 0))):
        with BuildLine():
            Line((6.198074913, 30.769413247), (-15.201438159, 29.11441495))
            Line((-15.201438159, 29.11441495), (-14.174464608, -13.890102476))
            Line((-14.174464608, -13.890102476), (0, -13.551607799))
            Line((0, -13.551607799), (-1.07082991, -11.148691551))
            add(Edge.make_bspline(
                [(-1.07082991, -11.148691551), (-4.632098822, -11.372542323), (-9.743745913, -8.365778862), (-10.905982833, -2.80619952), (-12.563842534, 11.227564879), (-5.891605094, 27.30233233), (6.198074913, 30.769413247)],
                knots=[0, 0, 0, 0, 0.203093444, 0.264365632, 0.313017022, 1, 1, 1, 1], degree=3))
        make_face()
    extrude(amount=CUT_EXTRUDE_4_DEPTH, mode=Mode.SUBTRACT)

    # 草图7 → 凸台-拉伸6 (add)
    with BuildSketch(Plane(origin=(0, 3, 0), x_dir=(1, 0, 0), z_dir=(0, 1, 0))):
        with BuildLine():
            Line((67.267592809, -2.533381703), (62.796727439, -1.544387585))
            Line((62.796727439, -1.544387585), (59.283028619, 6.962462189))
            Line((59.283028619, 6.962462189), (25.589630625, 20.161737938))
            Line((25.589630625, 20.161737938), (9.982664815, 8.020864686))
            Line((9.982664815, 8.020864686), (9.982664815, 0))
            Line((9.982664815, 0), (6.138584566, -6.823705409))
            Line((6.138584566, -6.823705409), (-0.550115067, -10.360259238))
            Line((-0.550115067, -10.360259238), (-1.07082991, -11.148691551))
            add(Edge.make_bspline(
                [(-1.07082991, -11.148691551), (7.812669668, -11.919550611), (10.96181155, -2.856059757), (14.781270798, 9.242340193), (28.533124839, 15.181959499), (44.177561896, 11.550637389), (55.332290754, 5.54631354), (59.457312788, 2.134315772), (60.7283813, 0.393004228), (61.584454582, -1.828142583), (63.337302433, -3.344243945), (65.436862479, -3.898295904), (66.710060657, -3.145429133), (67.267592809, -2.533381703)],
                knots=[0, 0, 0, 0, 0.226108574, 0.31746352, 0.429095875, 0.705433638, 0.851538596, 0.872297984, 0.892425071, 0.926476328, 0.954706086, 0.970022879, 1, 1, 1, 1], degree=3))
        make_face()
    extrude(amount=-EXTRUDE_6_DEPTH)

    # 圆角20
    fillet_20_edges = [part.edges().sort_by_distance(p)[0] for p in [
        (15.414387437, 1.5, -8.020864686),
    ]]
    fillet(fillet_20_edges, radius=FILLET_20_R)

    # 圆角21
    fillet_21_edges = [part.edges().sort_by_distance(p)[0] for p in [
        (68.280862162, 1.5, -5.005189784),
    ]]
    fillet(fillet_21_edges, radius=FILLET_21_R)

    # 草图8 → 切除-拉伸5 (cut)
    with BuildSketch(Plane(origin=(0, 0, 0), x_dir=(1, 0, 0), z_dir=(0, 1, 0))):
        with Locations(Location((65, 0, 0), (0, 0, 270))):
            Circle(SKETCH_8_R)
    extrude(amount=CUT_EXTRUDE_5_DEPTH, mode=Mode.SUBTRACT)

    # 草图9 → 切除-拉伸6 (cut)
    with BuildSketch(Plane(origin=(0, 0, 0), x_dir=(1, 0, 0), z_dir=(0, 1, 0))):
        with Locations(Location((63.2, 6.5, 0), (0, 0, 270))):
            Circle(SKETCH_9_R)
        with Locations(Location((58.603805922, 11.096194078, 0), (0, 0, 270))):
            Circle(SKETCH_9_R)
        with Locations(Location((52.110193676, 15.768773665, 0), (0, 0, 270))):
            Circle(SKETCH_9_R)
    extrude(amount=CUT_EXTRUDE_6_DEPTH, mode=Mode.SUBTRACT)


solid = part.part
